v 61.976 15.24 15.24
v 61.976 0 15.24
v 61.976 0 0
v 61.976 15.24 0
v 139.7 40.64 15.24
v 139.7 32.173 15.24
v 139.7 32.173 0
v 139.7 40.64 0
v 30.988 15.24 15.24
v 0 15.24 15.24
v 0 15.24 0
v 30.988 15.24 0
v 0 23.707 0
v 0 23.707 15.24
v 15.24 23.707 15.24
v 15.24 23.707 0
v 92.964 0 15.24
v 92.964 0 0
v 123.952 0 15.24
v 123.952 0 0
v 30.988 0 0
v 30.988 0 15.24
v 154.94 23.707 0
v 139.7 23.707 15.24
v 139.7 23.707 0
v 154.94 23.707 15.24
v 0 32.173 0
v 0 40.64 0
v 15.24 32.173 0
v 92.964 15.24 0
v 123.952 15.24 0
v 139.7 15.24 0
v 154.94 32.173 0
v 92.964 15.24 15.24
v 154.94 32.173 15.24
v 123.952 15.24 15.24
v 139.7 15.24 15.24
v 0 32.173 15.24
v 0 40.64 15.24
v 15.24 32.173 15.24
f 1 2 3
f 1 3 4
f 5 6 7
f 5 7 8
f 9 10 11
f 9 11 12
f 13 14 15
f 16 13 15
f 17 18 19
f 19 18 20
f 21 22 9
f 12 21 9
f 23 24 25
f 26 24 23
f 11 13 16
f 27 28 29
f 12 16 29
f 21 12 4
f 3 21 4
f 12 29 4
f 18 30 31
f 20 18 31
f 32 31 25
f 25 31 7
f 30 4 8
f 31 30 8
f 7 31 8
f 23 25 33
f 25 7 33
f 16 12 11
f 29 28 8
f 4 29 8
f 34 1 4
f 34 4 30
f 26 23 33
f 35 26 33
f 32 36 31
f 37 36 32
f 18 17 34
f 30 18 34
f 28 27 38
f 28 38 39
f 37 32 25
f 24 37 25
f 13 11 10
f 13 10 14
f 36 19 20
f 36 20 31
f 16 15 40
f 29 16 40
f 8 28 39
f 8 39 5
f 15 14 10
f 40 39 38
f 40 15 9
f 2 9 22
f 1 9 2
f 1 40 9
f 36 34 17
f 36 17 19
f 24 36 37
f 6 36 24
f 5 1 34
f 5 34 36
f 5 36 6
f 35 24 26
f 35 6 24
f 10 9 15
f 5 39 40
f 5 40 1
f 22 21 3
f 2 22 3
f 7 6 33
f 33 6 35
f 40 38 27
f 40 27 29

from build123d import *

# Parameters (mm, degrees)
SKETCH1_W           = 154.94
SKETCH1_H           = 40.64
BOSS_EXTRUDE1_DEPTH = 15.24
SKETCH2_W           = 30.988
SKETCH2_H           = 15.24
CUT_EXTRUDE1_DEPTH  = 161.904539401
SKETCH3_W           = 15.24
SKETCH3_H           = 8.466666666
SKETCH3_H_2         = 8.466666667
CUT_EXTRUDE2_DEPTH  = 161.904539401


with BuildPart() as part:
    # Sketch1 → Boss-Extrude1 (new body)
    with BuildSketch(Plane.XY):
        with Locations((77.47, 20.32)):
            Rectangle(SKETCH1_W, SKETCH1_H)
    extrude(amount=BOSS_EXTRUDE1_DEPTH)

    # Sketch2 → Cut-Extrude1 (cut, through all)
    with BuildSketch(Plane.XY.offset(15.24)):
        with Locations((15.494, 7.62)):
            Rectangle(SKETCH2_W, SKETCH2_H)
        with Locations((77.47, 7.62)):
            Rectangle(SKETCH2_W, SKETCH2_H)
        with Locations((139.446, 7.62)):
            Rectangle(SKETCH2_W, SKETCH2_H)
    extrude(amount=-CUT_EXTRUDE1_DEPTH, mode=Mode.SUBTRACT)

    # Sketch3 → Cut-Extrude2 (cut, through all)
    with BuildSketch(Plane.XY.offset(15.24)):
        with Locations((7.62, 27.94)):
            Rectangle(SKETCH3_W, SKETCH3_H)
        with Locations((147.32, 36.406666667)):
            Rectangle(SKETCH3_W, SKETCH3_H_2)
        with Locations((147.32, 19.473333334)):
            Rectangle(SKETCH3_W, SKETCH3_H_2)
    extrude(amount=-CUT_EXTRUDE2_DEPTH, mode=Mode.SUBTRACT)


solid = part.part
